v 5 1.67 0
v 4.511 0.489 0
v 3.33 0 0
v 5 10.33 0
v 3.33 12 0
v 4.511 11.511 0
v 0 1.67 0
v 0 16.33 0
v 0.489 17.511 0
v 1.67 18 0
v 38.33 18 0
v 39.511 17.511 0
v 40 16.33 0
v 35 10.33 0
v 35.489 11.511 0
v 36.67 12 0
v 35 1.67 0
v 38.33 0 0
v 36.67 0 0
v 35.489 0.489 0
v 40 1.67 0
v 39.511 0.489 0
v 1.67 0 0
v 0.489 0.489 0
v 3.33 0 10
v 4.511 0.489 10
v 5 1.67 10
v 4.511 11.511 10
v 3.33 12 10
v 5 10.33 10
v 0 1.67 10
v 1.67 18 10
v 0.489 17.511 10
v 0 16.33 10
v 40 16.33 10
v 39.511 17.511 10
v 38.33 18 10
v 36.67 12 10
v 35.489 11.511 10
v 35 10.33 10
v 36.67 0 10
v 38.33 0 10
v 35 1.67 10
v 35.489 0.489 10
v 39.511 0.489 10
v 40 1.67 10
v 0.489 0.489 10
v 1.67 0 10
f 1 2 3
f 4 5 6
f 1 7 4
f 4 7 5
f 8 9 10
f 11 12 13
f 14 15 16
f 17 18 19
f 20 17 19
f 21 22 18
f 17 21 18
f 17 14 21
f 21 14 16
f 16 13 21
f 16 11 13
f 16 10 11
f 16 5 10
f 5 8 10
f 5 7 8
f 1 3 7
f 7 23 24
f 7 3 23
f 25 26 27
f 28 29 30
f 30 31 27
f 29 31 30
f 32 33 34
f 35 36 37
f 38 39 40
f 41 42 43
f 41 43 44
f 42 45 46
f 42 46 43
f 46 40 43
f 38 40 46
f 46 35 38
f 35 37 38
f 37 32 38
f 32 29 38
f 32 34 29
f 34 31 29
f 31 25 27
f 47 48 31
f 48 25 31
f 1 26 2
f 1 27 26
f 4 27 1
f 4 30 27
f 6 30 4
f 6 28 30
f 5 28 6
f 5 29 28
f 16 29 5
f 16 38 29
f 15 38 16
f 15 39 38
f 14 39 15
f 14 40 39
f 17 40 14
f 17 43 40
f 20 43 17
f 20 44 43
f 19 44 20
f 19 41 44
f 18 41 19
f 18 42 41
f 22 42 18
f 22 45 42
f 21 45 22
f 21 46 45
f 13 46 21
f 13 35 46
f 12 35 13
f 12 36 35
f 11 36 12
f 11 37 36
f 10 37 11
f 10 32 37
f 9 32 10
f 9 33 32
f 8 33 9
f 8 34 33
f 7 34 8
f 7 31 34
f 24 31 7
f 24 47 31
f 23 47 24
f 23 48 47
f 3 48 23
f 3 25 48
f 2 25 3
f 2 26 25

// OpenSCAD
$fn = 32;

// ----------------------------------------------------------------------
// Clip blank: staple clip, 10 mm thick
// ----------------------------------------------------------------------

// --- parameters (mm) ---
profile_height = 10;      // extrusion height
profile_points = 24;      // points of the closed outline

profile = [[0, 1.67], [0.489, 0.489], [1.67, 0], [3.33, 0], [4.511, 0.489], [5, 1.67], [5, 10.33], [4.511, 11.511], [3.33, 12], [36.67, 12], [35.489, 11.511], [35, 10.33], [35, 1.67], [35.489, 0.489], [36.67, 0], [38.33, 0], [39.511, 0.489], [40, 1.67], [40, 16.33], [39.511, 17.511], [38.33, 18], [1.67, 18], [0.489, 17.511], [0, 16.33]];  // single closed polygon, 24 points, counter clockwise

// --- the one profile operation ---
linear_extrude(height = profile_height) polygon(points = profile);
